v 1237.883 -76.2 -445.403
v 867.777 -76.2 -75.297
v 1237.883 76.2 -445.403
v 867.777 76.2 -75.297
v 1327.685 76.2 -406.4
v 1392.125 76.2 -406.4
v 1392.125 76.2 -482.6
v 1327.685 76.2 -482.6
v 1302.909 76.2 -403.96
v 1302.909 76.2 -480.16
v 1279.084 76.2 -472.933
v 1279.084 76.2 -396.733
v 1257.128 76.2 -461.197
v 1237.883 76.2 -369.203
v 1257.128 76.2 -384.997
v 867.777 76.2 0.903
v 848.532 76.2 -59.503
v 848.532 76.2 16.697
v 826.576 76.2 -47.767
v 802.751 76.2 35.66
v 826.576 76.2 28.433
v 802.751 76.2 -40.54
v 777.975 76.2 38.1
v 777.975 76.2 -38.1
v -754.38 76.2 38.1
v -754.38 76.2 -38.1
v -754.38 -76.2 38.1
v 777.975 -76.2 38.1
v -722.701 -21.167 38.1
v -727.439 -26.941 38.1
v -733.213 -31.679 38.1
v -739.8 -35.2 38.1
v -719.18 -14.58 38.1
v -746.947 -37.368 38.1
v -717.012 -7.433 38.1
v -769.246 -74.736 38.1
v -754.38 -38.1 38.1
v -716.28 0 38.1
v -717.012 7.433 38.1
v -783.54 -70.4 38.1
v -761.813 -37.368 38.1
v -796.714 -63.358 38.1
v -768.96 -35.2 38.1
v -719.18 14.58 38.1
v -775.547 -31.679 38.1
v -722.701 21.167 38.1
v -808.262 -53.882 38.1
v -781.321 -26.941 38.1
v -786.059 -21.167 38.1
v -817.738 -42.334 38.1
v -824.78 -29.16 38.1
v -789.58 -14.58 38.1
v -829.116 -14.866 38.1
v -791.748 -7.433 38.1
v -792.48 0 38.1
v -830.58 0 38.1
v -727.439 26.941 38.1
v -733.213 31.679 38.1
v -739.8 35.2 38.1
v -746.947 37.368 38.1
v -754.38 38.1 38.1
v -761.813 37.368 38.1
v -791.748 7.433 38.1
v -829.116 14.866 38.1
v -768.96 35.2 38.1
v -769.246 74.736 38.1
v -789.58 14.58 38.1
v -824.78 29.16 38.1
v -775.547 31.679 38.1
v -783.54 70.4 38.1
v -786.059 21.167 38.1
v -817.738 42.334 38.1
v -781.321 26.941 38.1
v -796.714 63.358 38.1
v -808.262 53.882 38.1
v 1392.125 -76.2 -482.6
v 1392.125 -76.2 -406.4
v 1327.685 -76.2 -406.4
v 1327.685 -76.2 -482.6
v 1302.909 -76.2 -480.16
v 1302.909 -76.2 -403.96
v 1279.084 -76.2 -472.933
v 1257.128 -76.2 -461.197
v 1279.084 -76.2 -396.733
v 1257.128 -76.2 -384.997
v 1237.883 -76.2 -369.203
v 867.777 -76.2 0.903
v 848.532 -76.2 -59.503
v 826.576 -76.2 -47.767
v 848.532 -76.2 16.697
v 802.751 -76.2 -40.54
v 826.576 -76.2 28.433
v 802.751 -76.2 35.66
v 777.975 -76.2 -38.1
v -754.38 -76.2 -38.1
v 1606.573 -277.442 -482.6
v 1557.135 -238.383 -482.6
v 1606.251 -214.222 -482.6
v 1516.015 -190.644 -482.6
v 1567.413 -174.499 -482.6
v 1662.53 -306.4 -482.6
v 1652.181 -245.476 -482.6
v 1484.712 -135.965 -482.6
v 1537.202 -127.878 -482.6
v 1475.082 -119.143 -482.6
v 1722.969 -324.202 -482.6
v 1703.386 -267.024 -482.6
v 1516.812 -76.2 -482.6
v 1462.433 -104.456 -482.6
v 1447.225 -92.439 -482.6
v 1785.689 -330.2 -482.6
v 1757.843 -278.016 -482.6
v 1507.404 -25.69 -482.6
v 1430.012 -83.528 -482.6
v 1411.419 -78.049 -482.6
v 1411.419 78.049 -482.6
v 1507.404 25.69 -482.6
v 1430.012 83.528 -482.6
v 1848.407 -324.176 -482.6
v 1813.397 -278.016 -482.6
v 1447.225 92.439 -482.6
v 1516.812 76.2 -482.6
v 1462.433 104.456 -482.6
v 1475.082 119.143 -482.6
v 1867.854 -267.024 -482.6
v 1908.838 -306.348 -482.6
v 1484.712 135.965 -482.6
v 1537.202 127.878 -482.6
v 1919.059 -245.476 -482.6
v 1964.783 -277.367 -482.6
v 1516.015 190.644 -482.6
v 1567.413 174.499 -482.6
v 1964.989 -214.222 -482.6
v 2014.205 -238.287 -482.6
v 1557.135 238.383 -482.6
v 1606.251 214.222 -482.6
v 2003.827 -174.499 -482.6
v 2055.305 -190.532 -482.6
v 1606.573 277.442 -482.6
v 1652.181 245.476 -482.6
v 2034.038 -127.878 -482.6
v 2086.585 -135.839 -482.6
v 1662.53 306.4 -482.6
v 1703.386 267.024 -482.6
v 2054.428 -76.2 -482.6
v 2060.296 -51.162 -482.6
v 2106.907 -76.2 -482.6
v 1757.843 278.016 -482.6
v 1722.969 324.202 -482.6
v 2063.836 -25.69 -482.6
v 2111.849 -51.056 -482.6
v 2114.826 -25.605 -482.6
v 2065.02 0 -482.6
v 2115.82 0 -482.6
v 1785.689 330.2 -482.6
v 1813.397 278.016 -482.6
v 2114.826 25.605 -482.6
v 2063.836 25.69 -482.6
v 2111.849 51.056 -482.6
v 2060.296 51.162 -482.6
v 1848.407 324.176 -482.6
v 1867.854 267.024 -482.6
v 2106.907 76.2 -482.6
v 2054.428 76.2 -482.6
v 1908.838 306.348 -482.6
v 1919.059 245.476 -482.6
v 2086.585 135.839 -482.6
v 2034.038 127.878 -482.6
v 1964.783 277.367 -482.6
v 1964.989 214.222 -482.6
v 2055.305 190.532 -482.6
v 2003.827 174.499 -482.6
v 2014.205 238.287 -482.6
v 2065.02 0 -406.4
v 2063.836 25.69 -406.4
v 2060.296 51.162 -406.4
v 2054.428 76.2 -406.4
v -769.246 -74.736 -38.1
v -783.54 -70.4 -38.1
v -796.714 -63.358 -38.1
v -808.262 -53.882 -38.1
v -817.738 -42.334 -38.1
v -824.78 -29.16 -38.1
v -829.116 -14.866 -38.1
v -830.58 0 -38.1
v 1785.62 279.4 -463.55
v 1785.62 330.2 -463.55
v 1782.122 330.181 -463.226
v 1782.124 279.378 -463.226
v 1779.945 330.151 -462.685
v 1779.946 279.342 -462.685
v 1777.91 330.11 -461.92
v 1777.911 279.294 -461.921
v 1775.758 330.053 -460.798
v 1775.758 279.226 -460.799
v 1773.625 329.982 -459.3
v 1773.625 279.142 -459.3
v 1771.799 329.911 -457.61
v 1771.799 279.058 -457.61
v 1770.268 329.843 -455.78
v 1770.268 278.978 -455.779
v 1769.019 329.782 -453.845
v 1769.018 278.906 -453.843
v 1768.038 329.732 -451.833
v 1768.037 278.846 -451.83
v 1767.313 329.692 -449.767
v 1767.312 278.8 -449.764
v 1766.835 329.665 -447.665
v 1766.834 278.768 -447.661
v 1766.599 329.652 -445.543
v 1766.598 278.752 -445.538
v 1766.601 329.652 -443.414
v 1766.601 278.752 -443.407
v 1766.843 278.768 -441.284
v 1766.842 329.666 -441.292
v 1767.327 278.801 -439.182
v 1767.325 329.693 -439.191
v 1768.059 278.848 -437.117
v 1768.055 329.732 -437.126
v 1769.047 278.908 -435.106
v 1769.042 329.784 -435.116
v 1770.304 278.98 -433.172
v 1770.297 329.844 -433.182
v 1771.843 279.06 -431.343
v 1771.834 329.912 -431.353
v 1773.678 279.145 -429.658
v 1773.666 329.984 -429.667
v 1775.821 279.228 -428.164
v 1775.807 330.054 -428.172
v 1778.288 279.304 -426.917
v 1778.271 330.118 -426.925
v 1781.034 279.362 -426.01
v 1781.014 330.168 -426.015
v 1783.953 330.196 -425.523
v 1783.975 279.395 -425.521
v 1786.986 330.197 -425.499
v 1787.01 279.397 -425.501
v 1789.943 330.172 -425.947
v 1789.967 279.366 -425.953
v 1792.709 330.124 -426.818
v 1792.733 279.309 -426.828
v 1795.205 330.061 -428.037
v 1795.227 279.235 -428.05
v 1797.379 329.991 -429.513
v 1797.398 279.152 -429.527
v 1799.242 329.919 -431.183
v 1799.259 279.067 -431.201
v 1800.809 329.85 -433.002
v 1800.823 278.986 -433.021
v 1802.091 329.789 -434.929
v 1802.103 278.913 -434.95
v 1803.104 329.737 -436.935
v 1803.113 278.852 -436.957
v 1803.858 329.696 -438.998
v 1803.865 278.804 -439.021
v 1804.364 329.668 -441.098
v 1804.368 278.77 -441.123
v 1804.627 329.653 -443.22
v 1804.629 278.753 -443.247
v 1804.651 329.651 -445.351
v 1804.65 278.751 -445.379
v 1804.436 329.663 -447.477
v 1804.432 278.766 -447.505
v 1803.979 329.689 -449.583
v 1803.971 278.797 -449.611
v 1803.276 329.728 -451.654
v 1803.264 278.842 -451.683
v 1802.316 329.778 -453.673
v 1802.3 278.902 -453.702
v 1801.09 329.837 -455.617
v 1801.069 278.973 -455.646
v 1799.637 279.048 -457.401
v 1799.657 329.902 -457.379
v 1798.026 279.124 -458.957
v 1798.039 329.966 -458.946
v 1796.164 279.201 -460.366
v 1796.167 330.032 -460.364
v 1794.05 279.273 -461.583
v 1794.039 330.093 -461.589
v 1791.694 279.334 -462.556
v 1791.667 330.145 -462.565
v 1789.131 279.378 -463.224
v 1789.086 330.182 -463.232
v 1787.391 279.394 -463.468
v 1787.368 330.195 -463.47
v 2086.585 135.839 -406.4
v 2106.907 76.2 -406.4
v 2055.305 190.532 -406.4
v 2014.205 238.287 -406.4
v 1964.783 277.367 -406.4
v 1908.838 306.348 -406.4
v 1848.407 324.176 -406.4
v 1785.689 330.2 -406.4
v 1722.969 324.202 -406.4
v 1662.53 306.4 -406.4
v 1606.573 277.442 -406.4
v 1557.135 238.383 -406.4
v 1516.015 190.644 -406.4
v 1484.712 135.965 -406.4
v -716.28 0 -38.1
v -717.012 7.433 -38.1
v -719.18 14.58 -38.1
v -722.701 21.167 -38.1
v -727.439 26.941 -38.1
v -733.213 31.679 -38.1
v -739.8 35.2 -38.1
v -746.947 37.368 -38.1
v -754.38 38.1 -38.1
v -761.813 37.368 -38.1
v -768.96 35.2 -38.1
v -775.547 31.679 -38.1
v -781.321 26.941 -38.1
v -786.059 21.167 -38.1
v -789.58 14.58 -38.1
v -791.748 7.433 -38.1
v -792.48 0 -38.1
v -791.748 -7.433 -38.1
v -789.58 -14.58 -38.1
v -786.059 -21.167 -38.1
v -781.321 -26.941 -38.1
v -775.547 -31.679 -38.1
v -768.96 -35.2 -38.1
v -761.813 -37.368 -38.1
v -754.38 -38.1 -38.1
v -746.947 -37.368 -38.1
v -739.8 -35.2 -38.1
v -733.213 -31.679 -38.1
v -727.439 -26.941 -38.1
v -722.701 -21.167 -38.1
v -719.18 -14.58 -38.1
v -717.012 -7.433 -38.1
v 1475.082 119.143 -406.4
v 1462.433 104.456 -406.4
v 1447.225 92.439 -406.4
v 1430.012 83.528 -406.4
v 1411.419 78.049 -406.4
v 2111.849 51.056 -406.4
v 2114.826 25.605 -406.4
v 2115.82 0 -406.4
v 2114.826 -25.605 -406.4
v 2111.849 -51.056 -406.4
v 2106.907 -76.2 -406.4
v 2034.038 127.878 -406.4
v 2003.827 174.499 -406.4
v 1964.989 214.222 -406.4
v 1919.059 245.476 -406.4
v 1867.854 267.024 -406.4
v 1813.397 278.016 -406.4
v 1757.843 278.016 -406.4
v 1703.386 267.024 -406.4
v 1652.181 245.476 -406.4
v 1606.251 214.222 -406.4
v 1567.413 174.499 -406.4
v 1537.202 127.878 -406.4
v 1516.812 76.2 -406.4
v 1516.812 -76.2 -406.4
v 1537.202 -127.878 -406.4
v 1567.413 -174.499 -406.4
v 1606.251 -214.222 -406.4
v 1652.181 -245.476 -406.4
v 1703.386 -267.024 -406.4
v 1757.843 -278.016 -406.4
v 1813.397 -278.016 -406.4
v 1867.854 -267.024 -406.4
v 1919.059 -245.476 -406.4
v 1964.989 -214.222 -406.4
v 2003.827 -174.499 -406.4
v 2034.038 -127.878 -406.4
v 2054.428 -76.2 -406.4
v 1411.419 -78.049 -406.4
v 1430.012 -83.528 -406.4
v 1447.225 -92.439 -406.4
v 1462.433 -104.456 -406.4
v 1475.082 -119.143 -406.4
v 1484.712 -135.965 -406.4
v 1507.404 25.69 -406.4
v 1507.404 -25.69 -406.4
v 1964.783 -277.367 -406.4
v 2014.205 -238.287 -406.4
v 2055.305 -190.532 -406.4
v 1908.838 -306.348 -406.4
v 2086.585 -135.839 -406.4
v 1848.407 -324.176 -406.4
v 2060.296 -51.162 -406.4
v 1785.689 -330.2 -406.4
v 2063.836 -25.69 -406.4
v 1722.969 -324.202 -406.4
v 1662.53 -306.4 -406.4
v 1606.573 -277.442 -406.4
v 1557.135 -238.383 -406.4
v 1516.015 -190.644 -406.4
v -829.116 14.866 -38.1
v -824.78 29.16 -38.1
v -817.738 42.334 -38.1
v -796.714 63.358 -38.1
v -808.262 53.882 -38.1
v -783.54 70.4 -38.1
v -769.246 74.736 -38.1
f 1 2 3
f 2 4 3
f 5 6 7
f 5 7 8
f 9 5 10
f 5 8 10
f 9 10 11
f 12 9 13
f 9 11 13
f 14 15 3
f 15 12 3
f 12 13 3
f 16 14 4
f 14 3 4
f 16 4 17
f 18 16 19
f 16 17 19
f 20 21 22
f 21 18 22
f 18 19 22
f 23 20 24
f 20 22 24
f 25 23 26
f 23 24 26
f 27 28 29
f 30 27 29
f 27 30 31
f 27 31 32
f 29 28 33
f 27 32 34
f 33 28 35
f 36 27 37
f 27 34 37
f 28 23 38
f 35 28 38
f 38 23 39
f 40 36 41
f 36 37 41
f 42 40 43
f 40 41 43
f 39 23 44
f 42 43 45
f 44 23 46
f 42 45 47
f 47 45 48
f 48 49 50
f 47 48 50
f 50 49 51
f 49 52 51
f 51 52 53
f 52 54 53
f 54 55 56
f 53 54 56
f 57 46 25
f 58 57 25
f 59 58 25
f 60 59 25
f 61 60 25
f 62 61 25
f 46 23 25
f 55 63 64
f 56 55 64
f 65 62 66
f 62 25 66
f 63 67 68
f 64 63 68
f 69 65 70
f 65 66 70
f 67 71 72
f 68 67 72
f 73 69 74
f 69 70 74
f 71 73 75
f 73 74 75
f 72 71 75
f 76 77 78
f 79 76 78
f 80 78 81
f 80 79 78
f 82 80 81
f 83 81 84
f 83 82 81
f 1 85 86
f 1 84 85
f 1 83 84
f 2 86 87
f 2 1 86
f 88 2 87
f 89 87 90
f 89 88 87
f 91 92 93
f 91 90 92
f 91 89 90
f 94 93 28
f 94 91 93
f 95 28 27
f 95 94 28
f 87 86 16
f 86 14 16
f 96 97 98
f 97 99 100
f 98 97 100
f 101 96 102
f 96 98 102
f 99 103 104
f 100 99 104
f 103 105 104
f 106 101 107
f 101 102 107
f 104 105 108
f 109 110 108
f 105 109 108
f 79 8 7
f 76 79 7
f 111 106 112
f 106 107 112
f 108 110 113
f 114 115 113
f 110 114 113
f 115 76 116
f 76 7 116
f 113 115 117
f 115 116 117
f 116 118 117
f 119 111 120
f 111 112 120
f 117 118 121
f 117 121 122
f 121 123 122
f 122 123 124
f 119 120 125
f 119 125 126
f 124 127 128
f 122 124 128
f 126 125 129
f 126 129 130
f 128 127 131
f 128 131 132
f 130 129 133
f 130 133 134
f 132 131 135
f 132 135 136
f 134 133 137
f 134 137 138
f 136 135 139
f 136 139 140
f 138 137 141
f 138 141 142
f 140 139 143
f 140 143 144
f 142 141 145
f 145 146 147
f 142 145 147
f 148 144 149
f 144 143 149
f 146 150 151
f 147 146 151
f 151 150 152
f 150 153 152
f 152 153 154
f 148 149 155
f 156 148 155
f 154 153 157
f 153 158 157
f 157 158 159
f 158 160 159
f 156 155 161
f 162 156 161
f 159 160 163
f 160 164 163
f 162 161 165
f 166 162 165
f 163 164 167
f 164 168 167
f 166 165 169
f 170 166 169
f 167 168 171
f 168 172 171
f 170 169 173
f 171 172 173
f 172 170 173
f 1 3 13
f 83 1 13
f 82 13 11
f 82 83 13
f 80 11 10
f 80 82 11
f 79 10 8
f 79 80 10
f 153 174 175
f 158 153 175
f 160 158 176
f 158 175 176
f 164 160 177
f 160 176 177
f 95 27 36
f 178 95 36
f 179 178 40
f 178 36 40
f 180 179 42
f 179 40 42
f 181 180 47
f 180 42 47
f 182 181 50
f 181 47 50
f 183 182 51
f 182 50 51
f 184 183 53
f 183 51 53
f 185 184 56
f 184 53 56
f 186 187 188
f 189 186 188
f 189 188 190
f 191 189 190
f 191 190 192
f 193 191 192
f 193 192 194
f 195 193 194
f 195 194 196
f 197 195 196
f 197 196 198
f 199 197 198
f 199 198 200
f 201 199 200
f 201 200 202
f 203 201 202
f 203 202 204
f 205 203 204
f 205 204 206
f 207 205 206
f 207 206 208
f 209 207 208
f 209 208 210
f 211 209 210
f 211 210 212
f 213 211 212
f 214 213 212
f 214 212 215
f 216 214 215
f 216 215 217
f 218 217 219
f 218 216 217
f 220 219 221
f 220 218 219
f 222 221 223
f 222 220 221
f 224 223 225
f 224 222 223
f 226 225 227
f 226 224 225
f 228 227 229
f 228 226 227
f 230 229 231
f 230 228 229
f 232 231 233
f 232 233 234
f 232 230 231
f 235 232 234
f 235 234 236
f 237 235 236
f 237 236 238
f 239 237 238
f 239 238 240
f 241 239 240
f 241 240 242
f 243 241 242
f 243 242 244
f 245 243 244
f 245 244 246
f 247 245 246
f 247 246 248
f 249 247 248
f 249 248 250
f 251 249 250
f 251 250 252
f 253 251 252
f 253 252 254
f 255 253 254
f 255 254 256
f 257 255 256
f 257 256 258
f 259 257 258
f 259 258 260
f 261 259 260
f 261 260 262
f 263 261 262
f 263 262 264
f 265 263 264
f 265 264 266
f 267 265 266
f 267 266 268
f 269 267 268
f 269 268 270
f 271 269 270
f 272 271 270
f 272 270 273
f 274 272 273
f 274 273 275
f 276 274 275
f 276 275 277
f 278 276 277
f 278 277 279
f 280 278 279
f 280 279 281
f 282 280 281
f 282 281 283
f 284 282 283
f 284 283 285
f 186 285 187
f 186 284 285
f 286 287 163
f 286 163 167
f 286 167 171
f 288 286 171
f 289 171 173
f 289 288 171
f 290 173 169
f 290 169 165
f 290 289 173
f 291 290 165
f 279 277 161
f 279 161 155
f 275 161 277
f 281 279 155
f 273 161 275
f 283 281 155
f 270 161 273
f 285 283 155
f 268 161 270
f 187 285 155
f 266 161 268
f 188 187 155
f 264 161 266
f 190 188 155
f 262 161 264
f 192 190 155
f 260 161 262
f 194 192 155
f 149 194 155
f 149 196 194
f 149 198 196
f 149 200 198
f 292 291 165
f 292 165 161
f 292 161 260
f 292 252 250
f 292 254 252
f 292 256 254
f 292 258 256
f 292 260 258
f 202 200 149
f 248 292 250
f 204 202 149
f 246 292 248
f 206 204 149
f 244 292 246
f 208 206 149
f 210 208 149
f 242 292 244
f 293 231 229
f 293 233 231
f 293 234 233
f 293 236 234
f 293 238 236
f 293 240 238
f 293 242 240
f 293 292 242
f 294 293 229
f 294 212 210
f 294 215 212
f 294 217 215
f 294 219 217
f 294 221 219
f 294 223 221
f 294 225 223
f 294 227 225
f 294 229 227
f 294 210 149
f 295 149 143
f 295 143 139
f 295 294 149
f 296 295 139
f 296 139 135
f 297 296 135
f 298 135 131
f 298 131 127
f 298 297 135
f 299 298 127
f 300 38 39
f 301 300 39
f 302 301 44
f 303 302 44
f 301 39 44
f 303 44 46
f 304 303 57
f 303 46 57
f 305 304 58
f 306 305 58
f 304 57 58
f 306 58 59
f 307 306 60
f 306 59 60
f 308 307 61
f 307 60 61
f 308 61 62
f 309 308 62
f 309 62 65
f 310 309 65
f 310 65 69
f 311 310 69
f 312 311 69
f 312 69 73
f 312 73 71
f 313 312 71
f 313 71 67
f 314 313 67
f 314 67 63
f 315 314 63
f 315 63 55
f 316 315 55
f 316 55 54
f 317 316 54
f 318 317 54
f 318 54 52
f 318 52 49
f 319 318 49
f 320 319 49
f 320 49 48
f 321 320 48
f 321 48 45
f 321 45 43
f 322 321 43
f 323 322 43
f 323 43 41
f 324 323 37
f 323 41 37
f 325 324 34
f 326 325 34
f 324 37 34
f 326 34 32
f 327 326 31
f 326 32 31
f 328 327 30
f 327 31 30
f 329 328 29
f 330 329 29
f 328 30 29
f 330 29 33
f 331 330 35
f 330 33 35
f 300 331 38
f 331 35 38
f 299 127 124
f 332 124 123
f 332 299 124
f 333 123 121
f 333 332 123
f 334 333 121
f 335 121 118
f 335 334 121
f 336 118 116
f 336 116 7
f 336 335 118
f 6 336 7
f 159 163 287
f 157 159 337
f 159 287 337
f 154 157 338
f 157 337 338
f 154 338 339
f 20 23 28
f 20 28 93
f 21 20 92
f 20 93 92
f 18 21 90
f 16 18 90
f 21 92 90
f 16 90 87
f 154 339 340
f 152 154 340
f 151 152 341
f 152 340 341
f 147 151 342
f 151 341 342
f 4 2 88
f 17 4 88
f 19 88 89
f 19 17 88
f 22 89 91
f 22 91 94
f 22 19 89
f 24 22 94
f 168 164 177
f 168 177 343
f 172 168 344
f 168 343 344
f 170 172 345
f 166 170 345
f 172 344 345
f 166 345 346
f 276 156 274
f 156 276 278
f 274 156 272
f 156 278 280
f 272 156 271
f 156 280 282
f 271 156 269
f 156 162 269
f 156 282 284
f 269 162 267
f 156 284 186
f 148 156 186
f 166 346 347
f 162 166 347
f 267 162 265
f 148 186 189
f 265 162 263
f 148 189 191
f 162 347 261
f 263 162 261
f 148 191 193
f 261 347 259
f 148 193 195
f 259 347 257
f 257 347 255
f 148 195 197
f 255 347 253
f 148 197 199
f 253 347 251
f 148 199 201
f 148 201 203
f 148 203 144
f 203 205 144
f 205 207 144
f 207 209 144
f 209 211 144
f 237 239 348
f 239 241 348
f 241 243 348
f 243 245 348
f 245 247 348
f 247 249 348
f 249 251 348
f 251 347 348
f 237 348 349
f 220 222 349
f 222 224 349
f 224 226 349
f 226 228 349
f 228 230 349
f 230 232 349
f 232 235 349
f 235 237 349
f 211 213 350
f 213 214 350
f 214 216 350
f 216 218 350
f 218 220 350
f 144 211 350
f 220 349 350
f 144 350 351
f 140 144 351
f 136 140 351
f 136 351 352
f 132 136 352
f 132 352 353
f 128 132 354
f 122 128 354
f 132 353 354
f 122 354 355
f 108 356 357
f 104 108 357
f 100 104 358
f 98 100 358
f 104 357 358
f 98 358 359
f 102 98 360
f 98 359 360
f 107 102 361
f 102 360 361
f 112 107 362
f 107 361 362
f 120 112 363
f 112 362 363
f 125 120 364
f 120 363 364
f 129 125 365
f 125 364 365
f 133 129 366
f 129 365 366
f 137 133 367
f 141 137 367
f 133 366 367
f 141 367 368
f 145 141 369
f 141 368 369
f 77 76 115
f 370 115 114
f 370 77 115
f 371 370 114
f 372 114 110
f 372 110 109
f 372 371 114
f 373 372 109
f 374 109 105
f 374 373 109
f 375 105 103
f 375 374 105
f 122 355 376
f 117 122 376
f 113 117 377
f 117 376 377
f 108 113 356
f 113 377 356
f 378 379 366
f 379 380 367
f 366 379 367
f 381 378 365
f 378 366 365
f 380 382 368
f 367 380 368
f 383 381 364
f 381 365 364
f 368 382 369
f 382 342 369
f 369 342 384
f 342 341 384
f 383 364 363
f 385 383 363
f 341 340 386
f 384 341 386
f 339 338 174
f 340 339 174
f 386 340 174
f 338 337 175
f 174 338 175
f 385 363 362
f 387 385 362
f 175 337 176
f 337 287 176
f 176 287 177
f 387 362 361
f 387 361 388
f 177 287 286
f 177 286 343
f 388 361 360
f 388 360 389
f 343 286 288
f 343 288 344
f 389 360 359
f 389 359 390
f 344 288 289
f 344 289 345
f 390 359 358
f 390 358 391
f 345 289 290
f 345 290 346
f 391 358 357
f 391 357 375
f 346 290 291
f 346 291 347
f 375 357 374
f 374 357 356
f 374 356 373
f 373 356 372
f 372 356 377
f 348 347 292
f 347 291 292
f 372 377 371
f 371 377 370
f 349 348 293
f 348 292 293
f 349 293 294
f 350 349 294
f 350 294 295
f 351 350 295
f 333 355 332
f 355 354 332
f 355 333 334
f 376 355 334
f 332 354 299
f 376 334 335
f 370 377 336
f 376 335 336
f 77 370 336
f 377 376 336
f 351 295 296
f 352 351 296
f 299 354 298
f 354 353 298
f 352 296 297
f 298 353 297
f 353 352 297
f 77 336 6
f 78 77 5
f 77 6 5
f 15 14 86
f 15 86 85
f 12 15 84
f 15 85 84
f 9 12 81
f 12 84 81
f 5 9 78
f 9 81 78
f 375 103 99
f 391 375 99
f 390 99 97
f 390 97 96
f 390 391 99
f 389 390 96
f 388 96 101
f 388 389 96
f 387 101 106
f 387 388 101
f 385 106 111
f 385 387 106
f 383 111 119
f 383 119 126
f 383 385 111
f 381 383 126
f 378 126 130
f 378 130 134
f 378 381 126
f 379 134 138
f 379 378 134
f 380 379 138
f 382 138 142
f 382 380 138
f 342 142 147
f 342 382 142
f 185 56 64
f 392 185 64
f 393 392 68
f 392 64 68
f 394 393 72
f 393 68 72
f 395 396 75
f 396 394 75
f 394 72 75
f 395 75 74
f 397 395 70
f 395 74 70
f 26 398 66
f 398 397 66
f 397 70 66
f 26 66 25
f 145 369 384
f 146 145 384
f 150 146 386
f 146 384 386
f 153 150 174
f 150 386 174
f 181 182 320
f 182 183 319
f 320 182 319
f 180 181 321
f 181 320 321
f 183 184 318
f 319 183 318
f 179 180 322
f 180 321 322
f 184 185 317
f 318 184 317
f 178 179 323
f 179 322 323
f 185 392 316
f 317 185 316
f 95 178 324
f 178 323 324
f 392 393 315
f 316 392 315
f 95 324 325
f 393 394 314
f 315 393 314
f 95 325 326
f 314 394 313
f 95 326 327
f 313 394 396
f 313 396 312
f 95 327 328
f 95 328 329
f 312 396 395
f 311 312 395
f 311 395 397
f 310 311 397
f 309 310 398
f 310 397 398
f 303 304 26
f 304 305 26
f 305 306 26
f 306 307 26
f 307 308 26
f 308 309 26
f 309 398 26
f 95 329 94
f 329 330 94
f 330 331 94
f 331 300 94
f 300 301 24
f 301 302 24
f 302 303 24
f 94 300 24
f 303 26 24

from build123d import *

# Parameters (mm, degrees)
BOSS_EXTRUDE1_DEPTH = 76.2
FILLET1_R           = 127
CUT_EXTRUDE1_DEPTH  = 152.4
SKETCH3_R           = 38.1
CUT_EXTRUDE2_DEPTH  = 152.4
SKETCH4_R           = 330.2
SKETCH4_R_2         = 279.4
BOSS_EXTRUDE2_DEPTH = 76.2
CUT_EXTRUDE3_DEPTH  = 76.2
FILLET2_R           = 101.6
SKETCH9_R           = 19.05
CUT_EXTRUDE4_DEPTH  = 2196.137597601


with BuildPart() as part:
    # Sketch1 → Boss-Extrude1 (new, symmetric)
    with BuildSketch(Plane(origin=(0, 0, 0), x_dir=(1, 0, 0), z_dir=(0, 1, 0))):
        Polygon((830.58, 38.1), (1275.08, 482.6), (2115.82, 482.6), (2115.82, 406.4), (1275.08, 406.4), (830.58, -38.1), (-830.58, -38.1), (-830.58, 38.1), align=None)
    extrude(amount=BOSS_EXTRUDE1_DEPTH, both=True)

    # Fillet1
    fillet1_edges = [part.edges().sort_by_distance(p)[0] for p in [
        (830.58, 0, -38.1),
        (1275.08, 0, -482.6),
        (1275.08, 0, -406.4),
        (830.58, 0, 38.1),
    ]]
    fillet(fillet1_edges, radius=FILLET1_R)

    # Sketch2 → Cut-Extrude1 (cut)
    with BuildSketch(Plane.XY.offset(38.1)):
        with BuildLine():
            ThreePointArc((-830.58, -4.12e-07), (-808.261536872, 53.881536581), (-754.38, 76.2))
            Line((-754.38, 76.2), (-830.58, 76.2))
            Line((-830.58, 76.2), (-830.58, -4.12e-07))
        make_face()
        with BuildLine():
            ThreePointArc((-754.38, -76.2), (-808.261536581, -53.881536872), (-830.58, -4.12e-07))
            Line((-830.58, -4.12e-07), (-830.58, -76.2))
            Line((-830.58, -76.2), (-754.38, -76.2))
        make_face()
    extrude(amount=-CUT_EXTRUDE1_DEPTH, mode=Mode.SUBTRACT)

    # Sketch3 → Cut-Extrude2 (cut)
    with BuildSketch(Plane.XY.offset(38.1)):
        with Locations((-754.38, 0)):
            Circle(SKETCH3_R)
    extrude(amount=-CUT_EXTRUDE2_DEPTH, mode=Mode.SUBTRACT)

    # Sketch4 → Boss-Extrude2 (add)
    with BuildSketch(Plane.XY.offset(-406.4)):
        with Locations((1785.62, 0)):
            Circle(SKETCH4_R)
        with Locations((1785.62, 0)):
            Circle(SKETCH4_R_2, mode=Mode.SUBTRACT)
    extrude(amount=-BOSS_EXTRUDE2_DEPTH)

    # Sketch5 → Cut-Extrude3 (cut)
    with BuildSketch(Plane.XY.offset(-406.4)):
        with BuildLine():
            ThreePointArc((2054.428333204, -76.2), (2062.359415604, -38.466295005), (2065.02, 0))
            ThreePointArc((2065.02, 0), (2062.359415604, 38.466295005), (2054.428333204, 76.2))
            Line((2054.428333204, 76.2), (1516.811666796, 76.2))
            ThreePointArc((1516.811666796, 76.2), (1506.22, 0), (1516.811666796, -76.2))
            Line((1516.811666796, -76.2), (2054.428333204, -76.2))
        make_face()
        with BuildLine():
            Line((2115.82, 76.2), (2106.907410273, 76.2))
            ThreePointArc((2106.907410273, 76.2), (2113.584283781, 38.359725806), (2115.82, 0))
            Line((2115.82, 0), (2115.82, 76.2))
        make_face()
        with BuildLine():
            Line((2115.82, -76.2), (2115.82, 0))
            ThreePointArc((2115.82, 0), (2113.584283781, -38.359725806), (2106.907410273, -76.2))
            Line((2106.907410273, -76.2), (2115.82, -76.2))
        make_face()
    extrude(amount=-CUT_EXTRUDE3_DEPTH, mode=Mode.SUBTRACT)

    # Fillet2
    fillet2_edges = [part.edges().sort_by_distance(p)[0] for p in [
        (1464.332589727, -76.2, -444.5),
        (1464.332589727, 76.2, -444.5),
    ]]
    fillet(fillet2_edges, radius=FILLET2_R)

    # Sketch9 → Cut-Extrude4 (cut, through all)
    with BuildSketch(Plane(origin=(0, 0, 0), x_dir=(1, 0, 0), z_dir=(0, 1, 0))):
        with Locations(Location((1785.62, 444.5, 0), (0, 0, 90))):
            Circle(SKETCH9_R)
    extrude(amount=CUT_EXTRUDE4_DEPTH, mode=Mode.SUBTRACT)


solid = part.part
